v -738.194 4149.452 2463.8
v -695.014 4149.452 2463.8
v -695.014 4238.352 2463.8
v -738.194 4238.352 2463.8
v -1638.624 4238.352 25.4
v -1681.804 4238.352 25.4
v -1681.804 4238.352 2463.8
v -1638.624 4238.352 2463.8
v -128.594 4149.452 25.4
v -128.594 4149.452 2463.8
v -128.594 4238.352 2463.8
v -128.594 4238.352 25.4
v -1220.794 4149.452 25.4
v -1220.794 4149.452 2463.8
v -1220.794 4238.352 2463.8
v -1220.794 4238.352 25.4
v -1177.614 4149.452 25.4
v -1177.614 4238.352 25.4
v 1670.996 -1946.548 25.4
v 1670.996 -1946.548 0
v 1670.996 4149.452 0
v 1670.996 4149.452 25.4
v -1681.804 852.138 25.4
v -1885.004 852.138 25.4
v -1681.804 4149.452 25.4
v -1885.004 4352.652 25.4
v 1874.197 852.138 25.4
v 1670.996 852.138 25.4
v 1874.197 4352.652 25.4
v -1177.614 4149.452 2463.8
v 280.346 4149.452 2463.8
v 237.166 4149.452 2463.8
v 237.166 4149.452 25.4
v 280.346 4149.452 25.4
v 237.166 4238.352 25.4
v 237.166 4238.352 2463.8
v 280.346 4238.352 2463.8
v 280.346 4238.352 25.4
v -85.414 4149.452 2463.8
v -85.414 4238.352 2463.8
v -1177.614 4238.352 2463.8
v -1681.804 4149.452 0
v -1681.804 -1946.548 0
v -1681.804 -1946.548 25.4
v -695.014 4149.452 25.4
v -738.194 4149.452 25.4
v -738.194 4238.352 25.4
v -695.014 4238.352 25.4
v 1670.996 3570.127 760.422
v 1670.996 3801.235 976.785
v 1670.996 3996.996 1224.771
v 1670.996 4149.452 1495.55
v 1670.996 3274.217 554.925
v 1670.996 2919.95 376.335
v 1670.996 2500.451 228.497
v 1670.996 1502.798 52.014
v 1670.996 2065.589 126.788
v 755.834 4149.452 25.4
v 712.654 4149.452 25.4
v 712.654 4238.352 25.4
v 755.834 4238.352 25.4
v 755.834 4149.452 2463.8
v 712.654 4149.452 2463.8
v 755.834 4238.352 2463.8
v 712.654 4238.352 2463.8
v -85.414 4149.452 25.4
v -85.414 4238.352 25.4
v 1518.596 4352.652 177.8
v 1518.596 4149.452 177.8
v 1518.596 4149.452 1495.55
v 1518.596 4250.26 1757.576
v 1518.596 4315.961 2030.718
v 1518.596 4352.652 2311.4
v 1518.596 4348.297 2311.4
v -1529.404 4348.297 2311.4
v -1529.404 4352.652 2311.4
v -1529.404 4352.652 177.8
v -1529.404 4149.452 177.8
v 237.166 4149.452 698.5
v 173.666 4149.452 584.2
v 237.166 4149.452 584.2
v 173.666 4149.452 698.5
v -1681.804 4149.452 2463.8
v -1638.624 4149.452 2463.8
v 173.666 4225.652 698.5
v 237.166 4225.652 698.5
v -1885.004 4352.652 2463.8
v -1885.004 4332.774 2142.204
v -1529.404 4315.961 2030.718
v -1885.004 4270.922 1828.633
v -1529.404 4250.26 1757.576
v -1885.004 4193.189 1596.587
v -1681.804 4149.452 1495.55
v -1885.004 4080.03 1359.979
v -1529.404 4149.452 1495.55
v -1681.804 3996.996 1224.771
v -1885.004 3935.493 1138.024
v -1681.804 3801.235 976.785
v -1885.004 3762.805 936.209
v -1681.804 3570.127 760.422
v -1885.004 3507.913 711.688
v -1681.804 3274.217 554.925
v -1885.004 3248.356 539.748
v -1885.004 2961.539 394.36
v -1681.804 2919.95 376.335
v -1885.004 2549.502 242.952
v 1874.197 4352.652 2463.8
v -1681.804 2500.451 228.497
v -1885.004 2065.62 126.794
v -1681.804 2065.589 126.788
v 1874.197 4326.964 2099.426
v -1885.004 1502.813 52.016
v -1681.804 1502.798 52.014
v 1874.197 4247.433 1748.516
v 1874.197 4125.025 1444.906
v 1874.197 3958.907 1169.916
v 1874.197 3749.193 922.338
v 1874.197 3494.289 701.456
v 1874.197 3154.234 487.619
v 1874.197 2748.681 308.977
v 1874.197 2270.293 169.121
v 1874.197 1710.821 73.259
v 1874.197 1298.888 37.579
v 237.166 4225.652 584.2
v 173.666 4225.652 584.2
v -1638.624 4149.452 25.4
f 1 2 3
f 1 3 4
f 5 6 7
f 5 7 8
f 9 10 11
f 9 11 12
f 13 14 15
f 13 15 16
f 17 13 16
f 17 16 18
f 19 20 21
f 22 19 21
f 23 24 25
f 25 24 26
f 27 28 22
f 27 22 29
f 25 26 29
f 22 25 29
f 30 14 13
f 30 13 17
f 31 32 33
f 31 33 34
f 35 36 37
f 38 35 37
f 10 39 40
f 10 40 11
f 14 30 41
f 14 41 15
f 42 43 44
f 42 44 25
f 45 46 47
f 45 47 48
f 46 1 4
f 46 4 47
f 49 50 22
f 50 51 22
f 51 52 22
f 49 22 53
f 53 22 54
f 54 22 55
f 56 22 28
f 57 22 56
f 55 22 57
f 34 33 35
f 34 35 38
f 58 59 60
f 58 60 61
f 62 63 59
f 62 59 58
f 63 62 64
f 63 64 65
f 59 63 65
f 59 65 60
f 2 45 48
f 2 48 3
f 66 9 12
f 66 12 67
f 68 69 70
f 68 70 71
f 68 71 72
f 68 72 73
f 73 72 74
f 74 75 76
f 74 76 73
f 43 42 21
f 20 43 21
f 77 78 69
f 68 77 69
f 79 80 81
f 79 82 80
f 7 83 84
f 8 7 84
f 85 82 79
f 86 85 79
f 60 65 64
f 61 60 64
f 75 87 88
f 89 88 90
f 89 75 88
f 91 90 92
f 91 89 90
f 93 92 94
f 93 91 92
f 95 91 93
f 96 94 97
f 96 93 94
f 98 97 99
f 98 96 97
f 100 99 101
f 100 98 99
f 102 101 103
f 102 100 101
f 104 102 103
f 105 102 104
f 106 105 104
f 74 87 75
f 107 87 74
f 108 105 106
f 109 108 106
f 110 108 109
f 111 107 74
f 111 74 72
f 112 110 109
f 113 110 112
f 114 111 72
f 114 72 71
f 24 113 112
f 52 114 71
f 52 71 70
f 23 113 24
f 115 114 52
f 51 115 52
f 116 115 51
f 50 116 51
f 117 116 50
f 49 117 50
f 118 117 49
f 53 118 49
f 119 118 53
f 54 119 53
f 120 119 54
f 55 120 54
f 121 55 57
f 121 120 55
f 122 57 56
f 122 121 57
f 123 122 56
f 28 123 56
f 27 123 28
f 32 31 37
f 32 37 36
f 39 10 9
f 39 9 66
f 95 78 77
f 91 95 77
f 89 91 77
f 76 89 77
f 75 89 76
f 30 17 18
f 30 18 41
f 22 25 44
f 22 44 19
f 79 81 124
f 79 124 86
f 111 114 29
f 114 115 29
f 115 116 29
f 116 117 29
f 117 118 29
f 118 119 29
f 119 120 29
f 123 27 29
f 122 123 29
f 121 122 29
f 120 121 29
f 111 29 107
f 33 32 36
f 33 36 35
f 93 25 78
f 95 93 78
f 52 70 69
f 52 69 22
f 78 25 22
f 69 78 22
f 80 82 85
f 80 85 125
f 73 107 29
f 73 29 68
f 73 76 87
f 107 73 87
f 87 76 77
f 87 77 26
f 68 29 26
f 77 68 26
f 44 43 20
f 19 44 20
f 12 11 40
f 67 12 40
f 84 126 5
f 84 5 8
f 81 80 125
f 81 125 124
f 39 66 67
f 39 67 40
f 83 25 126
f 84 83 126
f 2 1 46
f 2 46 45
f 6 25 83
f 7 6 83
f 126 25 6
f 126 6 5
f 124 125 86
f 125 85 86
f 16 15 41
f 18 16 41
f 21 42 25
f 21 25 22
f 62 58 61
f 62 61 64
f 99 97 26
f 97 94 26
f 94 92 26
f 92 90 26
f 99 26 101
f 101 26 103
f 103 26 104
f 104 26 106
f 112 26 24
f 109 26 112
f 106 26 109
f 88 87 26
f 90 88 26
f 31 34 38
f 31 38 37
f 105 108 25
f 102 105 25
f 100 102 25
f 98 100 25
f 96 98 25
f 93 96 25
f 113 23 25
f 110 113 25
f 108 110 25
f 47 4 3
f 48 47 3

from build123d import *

# Parameters (mm, degrees)
F0_W      = 3352.8
F0_H      = 6096
F1_DEPTH  = 25.4
F3_DEPTH  = 2438.4
F5_W      = 3048
F5_H      = 2133.6
F6_DEPTH  = 203.2000480652
F8_DEPTH  = 88.9
F7_W      = 43.18
F7_H      = 2438.4
F9_W      = 63.5
F9_H      = 57.15
F9_R      = 18.2732775263
F10_DEPTH = 76.2
F11_DEPTH = 3759.2010961304


with BuildPart() as f1:
    # F0 (on Top) → F1 (new body)
    with BuildSketch(Plane.XY):
        with Locations((-5.4035186768, 1101.4522645245)):
            Rectangle(F0_W, F0_H)
    extrude(amount=F1_DEPTH)


with BuildPart() as f3:
    # F2 (on face) → F3 (new body)
    with BuildSketch(Plane.XY.offset(25.4)):
        Polygon((-1681.8035186768, -1946.5477354755), (-1681.8035186768, 4149.4522645245), (1670.9964813232, 4149.4522645245), (1670.9964813232, -1946.5477354755), (1874.1965293884, -1946.5477354755), (1874.1965293884, 4352.6523125897), (-1885.0035667419, 4352.6523125897), (-1885.0035667419, -1946.5477354755), align=None)
    extrude(amount=F3_DEPTH)

    # F5 (on face) → F6 (cut, through all)
    with BuildSketch(Plane.XZ.offset(-4149.4522645245)):
        with Locations((-5.4035186768, 1244.6)):
            Rectangle(F5_W, F5_H)
    extrude(amount=-F6_DEPTH, mode=Mode.SUBTRACT)

    # F4 (on face) → F11 (cut, through all)
    with BuildSketch(Plane.YZ.offset(1874.1965293884)):
        with BuildLine():
            add(Edge.make_bspline(
                [(4352.6523125897, 2463.8), (4352.6523125897, 1166.9830083847), (3425.7471561432, 25.4), (852.1376252174, 25.4)],
                knots=[0, 0, 0, 0, 4266.0752028661, 4266.0752028661, 4266.0752028661, 4266.0752028661], degree=3))
            Line((4352.6523125897, 2463.8), (-1946.5477354755, 2463.8))
            Line((-1946.5477354755, 2463.8), (-1946.5477354755, 25.4))
            Line((-1946.5477354755, 25.4), (852.1376252174, 25.4))
        make_face()
    extrude(amount=-F11_DEPTH, mode=Mode.SUBTRACT)


with BuildPart() as f8:
    # F7 (on face) → F8 (new body)
    with BuildSketch(Plane.XZ.offset(-4149.4522645245)):
        Polygon((734.2444813232, 2463.8), (712.6544813232, 2463.8), (712.6544813232, 25.4), (755.8344813232, 25.4), (755.8344813232, 2463.8), align=None)
    extrude(amount=-F8_DEPTH)


with BuildPart() as f8b:
    # F7 (on face) → F8, piece 2 (new body)
    with BuildSketch(Plane.XZ.offset(-4149.4522645245)):
        Polygon((258.7564813232, 2463.8), (237.1664813232, 2463.8), (237.1664813232, 25.4), (280.3464813232, 25.4), (280.3464813232, 2463.8), align=None)
    extrude(amount=-F8_DEPTH)


with BuildPart() as f8c:
    # F7 (on face) → F8, piece 3 (new body)
    with BuildSketch(Plane.XZ.offset(-4149.4522645245)):
        Polygon((-107.0035186768, 2463.8), (-128.5935186768, 2463.8), (-128.5935186768, 25.4), (-85.4135186768, 25.4), (-85.4135186768, 2463.8), align=None)
    extrude(amount=-F8_DEPTH)


with BuildPart() as f8d:
    # F7 (on face) → F8, piece 4 (new body)
    with BuildSketch(Plane.XZ.offset(-4149.4522645245)):
        Polygon((-716.6035186768, 2463.8), (-738.1935186768, 2463.8), (-738.1935186768, 25.4), (-695.0135186768, 25.4), (-695.0135186768, 2463.8), align=None)
    extrude(amount=-F8_DEPTH)


with BuildPart() as f8e:
    # F7 (on face) → F8, piece 5 (new body)
    with BuildSketch(Plane.XZ.offset(-4149.4522645245)):
        Polygon((-1199.2035186768, 2463.8), (-1220.7935186768, 2463.8), (-1220.7935186768, 25.4), (-1177.6135186768, 25.4), (-1177.6135186768, 2463.8), align=None)
    extrude(amount=-F8_DEPTH)


with BuildPart() as f8f:
    # F7 (on face) → F8, piece 6 (new body)
    with BuildSketch(Plane.XZ.offset(-4149.4522645245)):
        with Locations((-1660.2135186768, 1244.6)):
            Rectangle(F7_W, F7_H)
    extrude(amount=-F8_DEPTH)


with BuildPart() as f10:
    # F9 (on face) → F10 (new body)
    with BuildSketch(Plane.XZ.offset(-4149.4522645245)):
        with Locations((205.4164813232, 612.775)):
            Rectangle(F9_W, F9_H)
        with Locations((206.4785659313, 613.4417653084)):
            Circle(F9_R, mode=Mode.SUBTRACT)
        with Locations((206.4785659313, 613.4417653084)):
            Circle(F9_R)
        with Locations((205.4164813232, 669.925)):
            Rectangle(F9_W, F9_H)
        with Locations((206.4706981182, 669.3662405014)):
            Circle(F9_R, mode=Mode.SUBTRACT)
        with Locations((206.4706981182, 669.3662405014)):
            Circle(F9_R)
    extrude(amount=-F10_DEPTH)


solid = Compound([f1.part, f3.part, f8.part, f8b.part, f8c.part, f8d.part, f8e.part, f8f.part, f10.part])
